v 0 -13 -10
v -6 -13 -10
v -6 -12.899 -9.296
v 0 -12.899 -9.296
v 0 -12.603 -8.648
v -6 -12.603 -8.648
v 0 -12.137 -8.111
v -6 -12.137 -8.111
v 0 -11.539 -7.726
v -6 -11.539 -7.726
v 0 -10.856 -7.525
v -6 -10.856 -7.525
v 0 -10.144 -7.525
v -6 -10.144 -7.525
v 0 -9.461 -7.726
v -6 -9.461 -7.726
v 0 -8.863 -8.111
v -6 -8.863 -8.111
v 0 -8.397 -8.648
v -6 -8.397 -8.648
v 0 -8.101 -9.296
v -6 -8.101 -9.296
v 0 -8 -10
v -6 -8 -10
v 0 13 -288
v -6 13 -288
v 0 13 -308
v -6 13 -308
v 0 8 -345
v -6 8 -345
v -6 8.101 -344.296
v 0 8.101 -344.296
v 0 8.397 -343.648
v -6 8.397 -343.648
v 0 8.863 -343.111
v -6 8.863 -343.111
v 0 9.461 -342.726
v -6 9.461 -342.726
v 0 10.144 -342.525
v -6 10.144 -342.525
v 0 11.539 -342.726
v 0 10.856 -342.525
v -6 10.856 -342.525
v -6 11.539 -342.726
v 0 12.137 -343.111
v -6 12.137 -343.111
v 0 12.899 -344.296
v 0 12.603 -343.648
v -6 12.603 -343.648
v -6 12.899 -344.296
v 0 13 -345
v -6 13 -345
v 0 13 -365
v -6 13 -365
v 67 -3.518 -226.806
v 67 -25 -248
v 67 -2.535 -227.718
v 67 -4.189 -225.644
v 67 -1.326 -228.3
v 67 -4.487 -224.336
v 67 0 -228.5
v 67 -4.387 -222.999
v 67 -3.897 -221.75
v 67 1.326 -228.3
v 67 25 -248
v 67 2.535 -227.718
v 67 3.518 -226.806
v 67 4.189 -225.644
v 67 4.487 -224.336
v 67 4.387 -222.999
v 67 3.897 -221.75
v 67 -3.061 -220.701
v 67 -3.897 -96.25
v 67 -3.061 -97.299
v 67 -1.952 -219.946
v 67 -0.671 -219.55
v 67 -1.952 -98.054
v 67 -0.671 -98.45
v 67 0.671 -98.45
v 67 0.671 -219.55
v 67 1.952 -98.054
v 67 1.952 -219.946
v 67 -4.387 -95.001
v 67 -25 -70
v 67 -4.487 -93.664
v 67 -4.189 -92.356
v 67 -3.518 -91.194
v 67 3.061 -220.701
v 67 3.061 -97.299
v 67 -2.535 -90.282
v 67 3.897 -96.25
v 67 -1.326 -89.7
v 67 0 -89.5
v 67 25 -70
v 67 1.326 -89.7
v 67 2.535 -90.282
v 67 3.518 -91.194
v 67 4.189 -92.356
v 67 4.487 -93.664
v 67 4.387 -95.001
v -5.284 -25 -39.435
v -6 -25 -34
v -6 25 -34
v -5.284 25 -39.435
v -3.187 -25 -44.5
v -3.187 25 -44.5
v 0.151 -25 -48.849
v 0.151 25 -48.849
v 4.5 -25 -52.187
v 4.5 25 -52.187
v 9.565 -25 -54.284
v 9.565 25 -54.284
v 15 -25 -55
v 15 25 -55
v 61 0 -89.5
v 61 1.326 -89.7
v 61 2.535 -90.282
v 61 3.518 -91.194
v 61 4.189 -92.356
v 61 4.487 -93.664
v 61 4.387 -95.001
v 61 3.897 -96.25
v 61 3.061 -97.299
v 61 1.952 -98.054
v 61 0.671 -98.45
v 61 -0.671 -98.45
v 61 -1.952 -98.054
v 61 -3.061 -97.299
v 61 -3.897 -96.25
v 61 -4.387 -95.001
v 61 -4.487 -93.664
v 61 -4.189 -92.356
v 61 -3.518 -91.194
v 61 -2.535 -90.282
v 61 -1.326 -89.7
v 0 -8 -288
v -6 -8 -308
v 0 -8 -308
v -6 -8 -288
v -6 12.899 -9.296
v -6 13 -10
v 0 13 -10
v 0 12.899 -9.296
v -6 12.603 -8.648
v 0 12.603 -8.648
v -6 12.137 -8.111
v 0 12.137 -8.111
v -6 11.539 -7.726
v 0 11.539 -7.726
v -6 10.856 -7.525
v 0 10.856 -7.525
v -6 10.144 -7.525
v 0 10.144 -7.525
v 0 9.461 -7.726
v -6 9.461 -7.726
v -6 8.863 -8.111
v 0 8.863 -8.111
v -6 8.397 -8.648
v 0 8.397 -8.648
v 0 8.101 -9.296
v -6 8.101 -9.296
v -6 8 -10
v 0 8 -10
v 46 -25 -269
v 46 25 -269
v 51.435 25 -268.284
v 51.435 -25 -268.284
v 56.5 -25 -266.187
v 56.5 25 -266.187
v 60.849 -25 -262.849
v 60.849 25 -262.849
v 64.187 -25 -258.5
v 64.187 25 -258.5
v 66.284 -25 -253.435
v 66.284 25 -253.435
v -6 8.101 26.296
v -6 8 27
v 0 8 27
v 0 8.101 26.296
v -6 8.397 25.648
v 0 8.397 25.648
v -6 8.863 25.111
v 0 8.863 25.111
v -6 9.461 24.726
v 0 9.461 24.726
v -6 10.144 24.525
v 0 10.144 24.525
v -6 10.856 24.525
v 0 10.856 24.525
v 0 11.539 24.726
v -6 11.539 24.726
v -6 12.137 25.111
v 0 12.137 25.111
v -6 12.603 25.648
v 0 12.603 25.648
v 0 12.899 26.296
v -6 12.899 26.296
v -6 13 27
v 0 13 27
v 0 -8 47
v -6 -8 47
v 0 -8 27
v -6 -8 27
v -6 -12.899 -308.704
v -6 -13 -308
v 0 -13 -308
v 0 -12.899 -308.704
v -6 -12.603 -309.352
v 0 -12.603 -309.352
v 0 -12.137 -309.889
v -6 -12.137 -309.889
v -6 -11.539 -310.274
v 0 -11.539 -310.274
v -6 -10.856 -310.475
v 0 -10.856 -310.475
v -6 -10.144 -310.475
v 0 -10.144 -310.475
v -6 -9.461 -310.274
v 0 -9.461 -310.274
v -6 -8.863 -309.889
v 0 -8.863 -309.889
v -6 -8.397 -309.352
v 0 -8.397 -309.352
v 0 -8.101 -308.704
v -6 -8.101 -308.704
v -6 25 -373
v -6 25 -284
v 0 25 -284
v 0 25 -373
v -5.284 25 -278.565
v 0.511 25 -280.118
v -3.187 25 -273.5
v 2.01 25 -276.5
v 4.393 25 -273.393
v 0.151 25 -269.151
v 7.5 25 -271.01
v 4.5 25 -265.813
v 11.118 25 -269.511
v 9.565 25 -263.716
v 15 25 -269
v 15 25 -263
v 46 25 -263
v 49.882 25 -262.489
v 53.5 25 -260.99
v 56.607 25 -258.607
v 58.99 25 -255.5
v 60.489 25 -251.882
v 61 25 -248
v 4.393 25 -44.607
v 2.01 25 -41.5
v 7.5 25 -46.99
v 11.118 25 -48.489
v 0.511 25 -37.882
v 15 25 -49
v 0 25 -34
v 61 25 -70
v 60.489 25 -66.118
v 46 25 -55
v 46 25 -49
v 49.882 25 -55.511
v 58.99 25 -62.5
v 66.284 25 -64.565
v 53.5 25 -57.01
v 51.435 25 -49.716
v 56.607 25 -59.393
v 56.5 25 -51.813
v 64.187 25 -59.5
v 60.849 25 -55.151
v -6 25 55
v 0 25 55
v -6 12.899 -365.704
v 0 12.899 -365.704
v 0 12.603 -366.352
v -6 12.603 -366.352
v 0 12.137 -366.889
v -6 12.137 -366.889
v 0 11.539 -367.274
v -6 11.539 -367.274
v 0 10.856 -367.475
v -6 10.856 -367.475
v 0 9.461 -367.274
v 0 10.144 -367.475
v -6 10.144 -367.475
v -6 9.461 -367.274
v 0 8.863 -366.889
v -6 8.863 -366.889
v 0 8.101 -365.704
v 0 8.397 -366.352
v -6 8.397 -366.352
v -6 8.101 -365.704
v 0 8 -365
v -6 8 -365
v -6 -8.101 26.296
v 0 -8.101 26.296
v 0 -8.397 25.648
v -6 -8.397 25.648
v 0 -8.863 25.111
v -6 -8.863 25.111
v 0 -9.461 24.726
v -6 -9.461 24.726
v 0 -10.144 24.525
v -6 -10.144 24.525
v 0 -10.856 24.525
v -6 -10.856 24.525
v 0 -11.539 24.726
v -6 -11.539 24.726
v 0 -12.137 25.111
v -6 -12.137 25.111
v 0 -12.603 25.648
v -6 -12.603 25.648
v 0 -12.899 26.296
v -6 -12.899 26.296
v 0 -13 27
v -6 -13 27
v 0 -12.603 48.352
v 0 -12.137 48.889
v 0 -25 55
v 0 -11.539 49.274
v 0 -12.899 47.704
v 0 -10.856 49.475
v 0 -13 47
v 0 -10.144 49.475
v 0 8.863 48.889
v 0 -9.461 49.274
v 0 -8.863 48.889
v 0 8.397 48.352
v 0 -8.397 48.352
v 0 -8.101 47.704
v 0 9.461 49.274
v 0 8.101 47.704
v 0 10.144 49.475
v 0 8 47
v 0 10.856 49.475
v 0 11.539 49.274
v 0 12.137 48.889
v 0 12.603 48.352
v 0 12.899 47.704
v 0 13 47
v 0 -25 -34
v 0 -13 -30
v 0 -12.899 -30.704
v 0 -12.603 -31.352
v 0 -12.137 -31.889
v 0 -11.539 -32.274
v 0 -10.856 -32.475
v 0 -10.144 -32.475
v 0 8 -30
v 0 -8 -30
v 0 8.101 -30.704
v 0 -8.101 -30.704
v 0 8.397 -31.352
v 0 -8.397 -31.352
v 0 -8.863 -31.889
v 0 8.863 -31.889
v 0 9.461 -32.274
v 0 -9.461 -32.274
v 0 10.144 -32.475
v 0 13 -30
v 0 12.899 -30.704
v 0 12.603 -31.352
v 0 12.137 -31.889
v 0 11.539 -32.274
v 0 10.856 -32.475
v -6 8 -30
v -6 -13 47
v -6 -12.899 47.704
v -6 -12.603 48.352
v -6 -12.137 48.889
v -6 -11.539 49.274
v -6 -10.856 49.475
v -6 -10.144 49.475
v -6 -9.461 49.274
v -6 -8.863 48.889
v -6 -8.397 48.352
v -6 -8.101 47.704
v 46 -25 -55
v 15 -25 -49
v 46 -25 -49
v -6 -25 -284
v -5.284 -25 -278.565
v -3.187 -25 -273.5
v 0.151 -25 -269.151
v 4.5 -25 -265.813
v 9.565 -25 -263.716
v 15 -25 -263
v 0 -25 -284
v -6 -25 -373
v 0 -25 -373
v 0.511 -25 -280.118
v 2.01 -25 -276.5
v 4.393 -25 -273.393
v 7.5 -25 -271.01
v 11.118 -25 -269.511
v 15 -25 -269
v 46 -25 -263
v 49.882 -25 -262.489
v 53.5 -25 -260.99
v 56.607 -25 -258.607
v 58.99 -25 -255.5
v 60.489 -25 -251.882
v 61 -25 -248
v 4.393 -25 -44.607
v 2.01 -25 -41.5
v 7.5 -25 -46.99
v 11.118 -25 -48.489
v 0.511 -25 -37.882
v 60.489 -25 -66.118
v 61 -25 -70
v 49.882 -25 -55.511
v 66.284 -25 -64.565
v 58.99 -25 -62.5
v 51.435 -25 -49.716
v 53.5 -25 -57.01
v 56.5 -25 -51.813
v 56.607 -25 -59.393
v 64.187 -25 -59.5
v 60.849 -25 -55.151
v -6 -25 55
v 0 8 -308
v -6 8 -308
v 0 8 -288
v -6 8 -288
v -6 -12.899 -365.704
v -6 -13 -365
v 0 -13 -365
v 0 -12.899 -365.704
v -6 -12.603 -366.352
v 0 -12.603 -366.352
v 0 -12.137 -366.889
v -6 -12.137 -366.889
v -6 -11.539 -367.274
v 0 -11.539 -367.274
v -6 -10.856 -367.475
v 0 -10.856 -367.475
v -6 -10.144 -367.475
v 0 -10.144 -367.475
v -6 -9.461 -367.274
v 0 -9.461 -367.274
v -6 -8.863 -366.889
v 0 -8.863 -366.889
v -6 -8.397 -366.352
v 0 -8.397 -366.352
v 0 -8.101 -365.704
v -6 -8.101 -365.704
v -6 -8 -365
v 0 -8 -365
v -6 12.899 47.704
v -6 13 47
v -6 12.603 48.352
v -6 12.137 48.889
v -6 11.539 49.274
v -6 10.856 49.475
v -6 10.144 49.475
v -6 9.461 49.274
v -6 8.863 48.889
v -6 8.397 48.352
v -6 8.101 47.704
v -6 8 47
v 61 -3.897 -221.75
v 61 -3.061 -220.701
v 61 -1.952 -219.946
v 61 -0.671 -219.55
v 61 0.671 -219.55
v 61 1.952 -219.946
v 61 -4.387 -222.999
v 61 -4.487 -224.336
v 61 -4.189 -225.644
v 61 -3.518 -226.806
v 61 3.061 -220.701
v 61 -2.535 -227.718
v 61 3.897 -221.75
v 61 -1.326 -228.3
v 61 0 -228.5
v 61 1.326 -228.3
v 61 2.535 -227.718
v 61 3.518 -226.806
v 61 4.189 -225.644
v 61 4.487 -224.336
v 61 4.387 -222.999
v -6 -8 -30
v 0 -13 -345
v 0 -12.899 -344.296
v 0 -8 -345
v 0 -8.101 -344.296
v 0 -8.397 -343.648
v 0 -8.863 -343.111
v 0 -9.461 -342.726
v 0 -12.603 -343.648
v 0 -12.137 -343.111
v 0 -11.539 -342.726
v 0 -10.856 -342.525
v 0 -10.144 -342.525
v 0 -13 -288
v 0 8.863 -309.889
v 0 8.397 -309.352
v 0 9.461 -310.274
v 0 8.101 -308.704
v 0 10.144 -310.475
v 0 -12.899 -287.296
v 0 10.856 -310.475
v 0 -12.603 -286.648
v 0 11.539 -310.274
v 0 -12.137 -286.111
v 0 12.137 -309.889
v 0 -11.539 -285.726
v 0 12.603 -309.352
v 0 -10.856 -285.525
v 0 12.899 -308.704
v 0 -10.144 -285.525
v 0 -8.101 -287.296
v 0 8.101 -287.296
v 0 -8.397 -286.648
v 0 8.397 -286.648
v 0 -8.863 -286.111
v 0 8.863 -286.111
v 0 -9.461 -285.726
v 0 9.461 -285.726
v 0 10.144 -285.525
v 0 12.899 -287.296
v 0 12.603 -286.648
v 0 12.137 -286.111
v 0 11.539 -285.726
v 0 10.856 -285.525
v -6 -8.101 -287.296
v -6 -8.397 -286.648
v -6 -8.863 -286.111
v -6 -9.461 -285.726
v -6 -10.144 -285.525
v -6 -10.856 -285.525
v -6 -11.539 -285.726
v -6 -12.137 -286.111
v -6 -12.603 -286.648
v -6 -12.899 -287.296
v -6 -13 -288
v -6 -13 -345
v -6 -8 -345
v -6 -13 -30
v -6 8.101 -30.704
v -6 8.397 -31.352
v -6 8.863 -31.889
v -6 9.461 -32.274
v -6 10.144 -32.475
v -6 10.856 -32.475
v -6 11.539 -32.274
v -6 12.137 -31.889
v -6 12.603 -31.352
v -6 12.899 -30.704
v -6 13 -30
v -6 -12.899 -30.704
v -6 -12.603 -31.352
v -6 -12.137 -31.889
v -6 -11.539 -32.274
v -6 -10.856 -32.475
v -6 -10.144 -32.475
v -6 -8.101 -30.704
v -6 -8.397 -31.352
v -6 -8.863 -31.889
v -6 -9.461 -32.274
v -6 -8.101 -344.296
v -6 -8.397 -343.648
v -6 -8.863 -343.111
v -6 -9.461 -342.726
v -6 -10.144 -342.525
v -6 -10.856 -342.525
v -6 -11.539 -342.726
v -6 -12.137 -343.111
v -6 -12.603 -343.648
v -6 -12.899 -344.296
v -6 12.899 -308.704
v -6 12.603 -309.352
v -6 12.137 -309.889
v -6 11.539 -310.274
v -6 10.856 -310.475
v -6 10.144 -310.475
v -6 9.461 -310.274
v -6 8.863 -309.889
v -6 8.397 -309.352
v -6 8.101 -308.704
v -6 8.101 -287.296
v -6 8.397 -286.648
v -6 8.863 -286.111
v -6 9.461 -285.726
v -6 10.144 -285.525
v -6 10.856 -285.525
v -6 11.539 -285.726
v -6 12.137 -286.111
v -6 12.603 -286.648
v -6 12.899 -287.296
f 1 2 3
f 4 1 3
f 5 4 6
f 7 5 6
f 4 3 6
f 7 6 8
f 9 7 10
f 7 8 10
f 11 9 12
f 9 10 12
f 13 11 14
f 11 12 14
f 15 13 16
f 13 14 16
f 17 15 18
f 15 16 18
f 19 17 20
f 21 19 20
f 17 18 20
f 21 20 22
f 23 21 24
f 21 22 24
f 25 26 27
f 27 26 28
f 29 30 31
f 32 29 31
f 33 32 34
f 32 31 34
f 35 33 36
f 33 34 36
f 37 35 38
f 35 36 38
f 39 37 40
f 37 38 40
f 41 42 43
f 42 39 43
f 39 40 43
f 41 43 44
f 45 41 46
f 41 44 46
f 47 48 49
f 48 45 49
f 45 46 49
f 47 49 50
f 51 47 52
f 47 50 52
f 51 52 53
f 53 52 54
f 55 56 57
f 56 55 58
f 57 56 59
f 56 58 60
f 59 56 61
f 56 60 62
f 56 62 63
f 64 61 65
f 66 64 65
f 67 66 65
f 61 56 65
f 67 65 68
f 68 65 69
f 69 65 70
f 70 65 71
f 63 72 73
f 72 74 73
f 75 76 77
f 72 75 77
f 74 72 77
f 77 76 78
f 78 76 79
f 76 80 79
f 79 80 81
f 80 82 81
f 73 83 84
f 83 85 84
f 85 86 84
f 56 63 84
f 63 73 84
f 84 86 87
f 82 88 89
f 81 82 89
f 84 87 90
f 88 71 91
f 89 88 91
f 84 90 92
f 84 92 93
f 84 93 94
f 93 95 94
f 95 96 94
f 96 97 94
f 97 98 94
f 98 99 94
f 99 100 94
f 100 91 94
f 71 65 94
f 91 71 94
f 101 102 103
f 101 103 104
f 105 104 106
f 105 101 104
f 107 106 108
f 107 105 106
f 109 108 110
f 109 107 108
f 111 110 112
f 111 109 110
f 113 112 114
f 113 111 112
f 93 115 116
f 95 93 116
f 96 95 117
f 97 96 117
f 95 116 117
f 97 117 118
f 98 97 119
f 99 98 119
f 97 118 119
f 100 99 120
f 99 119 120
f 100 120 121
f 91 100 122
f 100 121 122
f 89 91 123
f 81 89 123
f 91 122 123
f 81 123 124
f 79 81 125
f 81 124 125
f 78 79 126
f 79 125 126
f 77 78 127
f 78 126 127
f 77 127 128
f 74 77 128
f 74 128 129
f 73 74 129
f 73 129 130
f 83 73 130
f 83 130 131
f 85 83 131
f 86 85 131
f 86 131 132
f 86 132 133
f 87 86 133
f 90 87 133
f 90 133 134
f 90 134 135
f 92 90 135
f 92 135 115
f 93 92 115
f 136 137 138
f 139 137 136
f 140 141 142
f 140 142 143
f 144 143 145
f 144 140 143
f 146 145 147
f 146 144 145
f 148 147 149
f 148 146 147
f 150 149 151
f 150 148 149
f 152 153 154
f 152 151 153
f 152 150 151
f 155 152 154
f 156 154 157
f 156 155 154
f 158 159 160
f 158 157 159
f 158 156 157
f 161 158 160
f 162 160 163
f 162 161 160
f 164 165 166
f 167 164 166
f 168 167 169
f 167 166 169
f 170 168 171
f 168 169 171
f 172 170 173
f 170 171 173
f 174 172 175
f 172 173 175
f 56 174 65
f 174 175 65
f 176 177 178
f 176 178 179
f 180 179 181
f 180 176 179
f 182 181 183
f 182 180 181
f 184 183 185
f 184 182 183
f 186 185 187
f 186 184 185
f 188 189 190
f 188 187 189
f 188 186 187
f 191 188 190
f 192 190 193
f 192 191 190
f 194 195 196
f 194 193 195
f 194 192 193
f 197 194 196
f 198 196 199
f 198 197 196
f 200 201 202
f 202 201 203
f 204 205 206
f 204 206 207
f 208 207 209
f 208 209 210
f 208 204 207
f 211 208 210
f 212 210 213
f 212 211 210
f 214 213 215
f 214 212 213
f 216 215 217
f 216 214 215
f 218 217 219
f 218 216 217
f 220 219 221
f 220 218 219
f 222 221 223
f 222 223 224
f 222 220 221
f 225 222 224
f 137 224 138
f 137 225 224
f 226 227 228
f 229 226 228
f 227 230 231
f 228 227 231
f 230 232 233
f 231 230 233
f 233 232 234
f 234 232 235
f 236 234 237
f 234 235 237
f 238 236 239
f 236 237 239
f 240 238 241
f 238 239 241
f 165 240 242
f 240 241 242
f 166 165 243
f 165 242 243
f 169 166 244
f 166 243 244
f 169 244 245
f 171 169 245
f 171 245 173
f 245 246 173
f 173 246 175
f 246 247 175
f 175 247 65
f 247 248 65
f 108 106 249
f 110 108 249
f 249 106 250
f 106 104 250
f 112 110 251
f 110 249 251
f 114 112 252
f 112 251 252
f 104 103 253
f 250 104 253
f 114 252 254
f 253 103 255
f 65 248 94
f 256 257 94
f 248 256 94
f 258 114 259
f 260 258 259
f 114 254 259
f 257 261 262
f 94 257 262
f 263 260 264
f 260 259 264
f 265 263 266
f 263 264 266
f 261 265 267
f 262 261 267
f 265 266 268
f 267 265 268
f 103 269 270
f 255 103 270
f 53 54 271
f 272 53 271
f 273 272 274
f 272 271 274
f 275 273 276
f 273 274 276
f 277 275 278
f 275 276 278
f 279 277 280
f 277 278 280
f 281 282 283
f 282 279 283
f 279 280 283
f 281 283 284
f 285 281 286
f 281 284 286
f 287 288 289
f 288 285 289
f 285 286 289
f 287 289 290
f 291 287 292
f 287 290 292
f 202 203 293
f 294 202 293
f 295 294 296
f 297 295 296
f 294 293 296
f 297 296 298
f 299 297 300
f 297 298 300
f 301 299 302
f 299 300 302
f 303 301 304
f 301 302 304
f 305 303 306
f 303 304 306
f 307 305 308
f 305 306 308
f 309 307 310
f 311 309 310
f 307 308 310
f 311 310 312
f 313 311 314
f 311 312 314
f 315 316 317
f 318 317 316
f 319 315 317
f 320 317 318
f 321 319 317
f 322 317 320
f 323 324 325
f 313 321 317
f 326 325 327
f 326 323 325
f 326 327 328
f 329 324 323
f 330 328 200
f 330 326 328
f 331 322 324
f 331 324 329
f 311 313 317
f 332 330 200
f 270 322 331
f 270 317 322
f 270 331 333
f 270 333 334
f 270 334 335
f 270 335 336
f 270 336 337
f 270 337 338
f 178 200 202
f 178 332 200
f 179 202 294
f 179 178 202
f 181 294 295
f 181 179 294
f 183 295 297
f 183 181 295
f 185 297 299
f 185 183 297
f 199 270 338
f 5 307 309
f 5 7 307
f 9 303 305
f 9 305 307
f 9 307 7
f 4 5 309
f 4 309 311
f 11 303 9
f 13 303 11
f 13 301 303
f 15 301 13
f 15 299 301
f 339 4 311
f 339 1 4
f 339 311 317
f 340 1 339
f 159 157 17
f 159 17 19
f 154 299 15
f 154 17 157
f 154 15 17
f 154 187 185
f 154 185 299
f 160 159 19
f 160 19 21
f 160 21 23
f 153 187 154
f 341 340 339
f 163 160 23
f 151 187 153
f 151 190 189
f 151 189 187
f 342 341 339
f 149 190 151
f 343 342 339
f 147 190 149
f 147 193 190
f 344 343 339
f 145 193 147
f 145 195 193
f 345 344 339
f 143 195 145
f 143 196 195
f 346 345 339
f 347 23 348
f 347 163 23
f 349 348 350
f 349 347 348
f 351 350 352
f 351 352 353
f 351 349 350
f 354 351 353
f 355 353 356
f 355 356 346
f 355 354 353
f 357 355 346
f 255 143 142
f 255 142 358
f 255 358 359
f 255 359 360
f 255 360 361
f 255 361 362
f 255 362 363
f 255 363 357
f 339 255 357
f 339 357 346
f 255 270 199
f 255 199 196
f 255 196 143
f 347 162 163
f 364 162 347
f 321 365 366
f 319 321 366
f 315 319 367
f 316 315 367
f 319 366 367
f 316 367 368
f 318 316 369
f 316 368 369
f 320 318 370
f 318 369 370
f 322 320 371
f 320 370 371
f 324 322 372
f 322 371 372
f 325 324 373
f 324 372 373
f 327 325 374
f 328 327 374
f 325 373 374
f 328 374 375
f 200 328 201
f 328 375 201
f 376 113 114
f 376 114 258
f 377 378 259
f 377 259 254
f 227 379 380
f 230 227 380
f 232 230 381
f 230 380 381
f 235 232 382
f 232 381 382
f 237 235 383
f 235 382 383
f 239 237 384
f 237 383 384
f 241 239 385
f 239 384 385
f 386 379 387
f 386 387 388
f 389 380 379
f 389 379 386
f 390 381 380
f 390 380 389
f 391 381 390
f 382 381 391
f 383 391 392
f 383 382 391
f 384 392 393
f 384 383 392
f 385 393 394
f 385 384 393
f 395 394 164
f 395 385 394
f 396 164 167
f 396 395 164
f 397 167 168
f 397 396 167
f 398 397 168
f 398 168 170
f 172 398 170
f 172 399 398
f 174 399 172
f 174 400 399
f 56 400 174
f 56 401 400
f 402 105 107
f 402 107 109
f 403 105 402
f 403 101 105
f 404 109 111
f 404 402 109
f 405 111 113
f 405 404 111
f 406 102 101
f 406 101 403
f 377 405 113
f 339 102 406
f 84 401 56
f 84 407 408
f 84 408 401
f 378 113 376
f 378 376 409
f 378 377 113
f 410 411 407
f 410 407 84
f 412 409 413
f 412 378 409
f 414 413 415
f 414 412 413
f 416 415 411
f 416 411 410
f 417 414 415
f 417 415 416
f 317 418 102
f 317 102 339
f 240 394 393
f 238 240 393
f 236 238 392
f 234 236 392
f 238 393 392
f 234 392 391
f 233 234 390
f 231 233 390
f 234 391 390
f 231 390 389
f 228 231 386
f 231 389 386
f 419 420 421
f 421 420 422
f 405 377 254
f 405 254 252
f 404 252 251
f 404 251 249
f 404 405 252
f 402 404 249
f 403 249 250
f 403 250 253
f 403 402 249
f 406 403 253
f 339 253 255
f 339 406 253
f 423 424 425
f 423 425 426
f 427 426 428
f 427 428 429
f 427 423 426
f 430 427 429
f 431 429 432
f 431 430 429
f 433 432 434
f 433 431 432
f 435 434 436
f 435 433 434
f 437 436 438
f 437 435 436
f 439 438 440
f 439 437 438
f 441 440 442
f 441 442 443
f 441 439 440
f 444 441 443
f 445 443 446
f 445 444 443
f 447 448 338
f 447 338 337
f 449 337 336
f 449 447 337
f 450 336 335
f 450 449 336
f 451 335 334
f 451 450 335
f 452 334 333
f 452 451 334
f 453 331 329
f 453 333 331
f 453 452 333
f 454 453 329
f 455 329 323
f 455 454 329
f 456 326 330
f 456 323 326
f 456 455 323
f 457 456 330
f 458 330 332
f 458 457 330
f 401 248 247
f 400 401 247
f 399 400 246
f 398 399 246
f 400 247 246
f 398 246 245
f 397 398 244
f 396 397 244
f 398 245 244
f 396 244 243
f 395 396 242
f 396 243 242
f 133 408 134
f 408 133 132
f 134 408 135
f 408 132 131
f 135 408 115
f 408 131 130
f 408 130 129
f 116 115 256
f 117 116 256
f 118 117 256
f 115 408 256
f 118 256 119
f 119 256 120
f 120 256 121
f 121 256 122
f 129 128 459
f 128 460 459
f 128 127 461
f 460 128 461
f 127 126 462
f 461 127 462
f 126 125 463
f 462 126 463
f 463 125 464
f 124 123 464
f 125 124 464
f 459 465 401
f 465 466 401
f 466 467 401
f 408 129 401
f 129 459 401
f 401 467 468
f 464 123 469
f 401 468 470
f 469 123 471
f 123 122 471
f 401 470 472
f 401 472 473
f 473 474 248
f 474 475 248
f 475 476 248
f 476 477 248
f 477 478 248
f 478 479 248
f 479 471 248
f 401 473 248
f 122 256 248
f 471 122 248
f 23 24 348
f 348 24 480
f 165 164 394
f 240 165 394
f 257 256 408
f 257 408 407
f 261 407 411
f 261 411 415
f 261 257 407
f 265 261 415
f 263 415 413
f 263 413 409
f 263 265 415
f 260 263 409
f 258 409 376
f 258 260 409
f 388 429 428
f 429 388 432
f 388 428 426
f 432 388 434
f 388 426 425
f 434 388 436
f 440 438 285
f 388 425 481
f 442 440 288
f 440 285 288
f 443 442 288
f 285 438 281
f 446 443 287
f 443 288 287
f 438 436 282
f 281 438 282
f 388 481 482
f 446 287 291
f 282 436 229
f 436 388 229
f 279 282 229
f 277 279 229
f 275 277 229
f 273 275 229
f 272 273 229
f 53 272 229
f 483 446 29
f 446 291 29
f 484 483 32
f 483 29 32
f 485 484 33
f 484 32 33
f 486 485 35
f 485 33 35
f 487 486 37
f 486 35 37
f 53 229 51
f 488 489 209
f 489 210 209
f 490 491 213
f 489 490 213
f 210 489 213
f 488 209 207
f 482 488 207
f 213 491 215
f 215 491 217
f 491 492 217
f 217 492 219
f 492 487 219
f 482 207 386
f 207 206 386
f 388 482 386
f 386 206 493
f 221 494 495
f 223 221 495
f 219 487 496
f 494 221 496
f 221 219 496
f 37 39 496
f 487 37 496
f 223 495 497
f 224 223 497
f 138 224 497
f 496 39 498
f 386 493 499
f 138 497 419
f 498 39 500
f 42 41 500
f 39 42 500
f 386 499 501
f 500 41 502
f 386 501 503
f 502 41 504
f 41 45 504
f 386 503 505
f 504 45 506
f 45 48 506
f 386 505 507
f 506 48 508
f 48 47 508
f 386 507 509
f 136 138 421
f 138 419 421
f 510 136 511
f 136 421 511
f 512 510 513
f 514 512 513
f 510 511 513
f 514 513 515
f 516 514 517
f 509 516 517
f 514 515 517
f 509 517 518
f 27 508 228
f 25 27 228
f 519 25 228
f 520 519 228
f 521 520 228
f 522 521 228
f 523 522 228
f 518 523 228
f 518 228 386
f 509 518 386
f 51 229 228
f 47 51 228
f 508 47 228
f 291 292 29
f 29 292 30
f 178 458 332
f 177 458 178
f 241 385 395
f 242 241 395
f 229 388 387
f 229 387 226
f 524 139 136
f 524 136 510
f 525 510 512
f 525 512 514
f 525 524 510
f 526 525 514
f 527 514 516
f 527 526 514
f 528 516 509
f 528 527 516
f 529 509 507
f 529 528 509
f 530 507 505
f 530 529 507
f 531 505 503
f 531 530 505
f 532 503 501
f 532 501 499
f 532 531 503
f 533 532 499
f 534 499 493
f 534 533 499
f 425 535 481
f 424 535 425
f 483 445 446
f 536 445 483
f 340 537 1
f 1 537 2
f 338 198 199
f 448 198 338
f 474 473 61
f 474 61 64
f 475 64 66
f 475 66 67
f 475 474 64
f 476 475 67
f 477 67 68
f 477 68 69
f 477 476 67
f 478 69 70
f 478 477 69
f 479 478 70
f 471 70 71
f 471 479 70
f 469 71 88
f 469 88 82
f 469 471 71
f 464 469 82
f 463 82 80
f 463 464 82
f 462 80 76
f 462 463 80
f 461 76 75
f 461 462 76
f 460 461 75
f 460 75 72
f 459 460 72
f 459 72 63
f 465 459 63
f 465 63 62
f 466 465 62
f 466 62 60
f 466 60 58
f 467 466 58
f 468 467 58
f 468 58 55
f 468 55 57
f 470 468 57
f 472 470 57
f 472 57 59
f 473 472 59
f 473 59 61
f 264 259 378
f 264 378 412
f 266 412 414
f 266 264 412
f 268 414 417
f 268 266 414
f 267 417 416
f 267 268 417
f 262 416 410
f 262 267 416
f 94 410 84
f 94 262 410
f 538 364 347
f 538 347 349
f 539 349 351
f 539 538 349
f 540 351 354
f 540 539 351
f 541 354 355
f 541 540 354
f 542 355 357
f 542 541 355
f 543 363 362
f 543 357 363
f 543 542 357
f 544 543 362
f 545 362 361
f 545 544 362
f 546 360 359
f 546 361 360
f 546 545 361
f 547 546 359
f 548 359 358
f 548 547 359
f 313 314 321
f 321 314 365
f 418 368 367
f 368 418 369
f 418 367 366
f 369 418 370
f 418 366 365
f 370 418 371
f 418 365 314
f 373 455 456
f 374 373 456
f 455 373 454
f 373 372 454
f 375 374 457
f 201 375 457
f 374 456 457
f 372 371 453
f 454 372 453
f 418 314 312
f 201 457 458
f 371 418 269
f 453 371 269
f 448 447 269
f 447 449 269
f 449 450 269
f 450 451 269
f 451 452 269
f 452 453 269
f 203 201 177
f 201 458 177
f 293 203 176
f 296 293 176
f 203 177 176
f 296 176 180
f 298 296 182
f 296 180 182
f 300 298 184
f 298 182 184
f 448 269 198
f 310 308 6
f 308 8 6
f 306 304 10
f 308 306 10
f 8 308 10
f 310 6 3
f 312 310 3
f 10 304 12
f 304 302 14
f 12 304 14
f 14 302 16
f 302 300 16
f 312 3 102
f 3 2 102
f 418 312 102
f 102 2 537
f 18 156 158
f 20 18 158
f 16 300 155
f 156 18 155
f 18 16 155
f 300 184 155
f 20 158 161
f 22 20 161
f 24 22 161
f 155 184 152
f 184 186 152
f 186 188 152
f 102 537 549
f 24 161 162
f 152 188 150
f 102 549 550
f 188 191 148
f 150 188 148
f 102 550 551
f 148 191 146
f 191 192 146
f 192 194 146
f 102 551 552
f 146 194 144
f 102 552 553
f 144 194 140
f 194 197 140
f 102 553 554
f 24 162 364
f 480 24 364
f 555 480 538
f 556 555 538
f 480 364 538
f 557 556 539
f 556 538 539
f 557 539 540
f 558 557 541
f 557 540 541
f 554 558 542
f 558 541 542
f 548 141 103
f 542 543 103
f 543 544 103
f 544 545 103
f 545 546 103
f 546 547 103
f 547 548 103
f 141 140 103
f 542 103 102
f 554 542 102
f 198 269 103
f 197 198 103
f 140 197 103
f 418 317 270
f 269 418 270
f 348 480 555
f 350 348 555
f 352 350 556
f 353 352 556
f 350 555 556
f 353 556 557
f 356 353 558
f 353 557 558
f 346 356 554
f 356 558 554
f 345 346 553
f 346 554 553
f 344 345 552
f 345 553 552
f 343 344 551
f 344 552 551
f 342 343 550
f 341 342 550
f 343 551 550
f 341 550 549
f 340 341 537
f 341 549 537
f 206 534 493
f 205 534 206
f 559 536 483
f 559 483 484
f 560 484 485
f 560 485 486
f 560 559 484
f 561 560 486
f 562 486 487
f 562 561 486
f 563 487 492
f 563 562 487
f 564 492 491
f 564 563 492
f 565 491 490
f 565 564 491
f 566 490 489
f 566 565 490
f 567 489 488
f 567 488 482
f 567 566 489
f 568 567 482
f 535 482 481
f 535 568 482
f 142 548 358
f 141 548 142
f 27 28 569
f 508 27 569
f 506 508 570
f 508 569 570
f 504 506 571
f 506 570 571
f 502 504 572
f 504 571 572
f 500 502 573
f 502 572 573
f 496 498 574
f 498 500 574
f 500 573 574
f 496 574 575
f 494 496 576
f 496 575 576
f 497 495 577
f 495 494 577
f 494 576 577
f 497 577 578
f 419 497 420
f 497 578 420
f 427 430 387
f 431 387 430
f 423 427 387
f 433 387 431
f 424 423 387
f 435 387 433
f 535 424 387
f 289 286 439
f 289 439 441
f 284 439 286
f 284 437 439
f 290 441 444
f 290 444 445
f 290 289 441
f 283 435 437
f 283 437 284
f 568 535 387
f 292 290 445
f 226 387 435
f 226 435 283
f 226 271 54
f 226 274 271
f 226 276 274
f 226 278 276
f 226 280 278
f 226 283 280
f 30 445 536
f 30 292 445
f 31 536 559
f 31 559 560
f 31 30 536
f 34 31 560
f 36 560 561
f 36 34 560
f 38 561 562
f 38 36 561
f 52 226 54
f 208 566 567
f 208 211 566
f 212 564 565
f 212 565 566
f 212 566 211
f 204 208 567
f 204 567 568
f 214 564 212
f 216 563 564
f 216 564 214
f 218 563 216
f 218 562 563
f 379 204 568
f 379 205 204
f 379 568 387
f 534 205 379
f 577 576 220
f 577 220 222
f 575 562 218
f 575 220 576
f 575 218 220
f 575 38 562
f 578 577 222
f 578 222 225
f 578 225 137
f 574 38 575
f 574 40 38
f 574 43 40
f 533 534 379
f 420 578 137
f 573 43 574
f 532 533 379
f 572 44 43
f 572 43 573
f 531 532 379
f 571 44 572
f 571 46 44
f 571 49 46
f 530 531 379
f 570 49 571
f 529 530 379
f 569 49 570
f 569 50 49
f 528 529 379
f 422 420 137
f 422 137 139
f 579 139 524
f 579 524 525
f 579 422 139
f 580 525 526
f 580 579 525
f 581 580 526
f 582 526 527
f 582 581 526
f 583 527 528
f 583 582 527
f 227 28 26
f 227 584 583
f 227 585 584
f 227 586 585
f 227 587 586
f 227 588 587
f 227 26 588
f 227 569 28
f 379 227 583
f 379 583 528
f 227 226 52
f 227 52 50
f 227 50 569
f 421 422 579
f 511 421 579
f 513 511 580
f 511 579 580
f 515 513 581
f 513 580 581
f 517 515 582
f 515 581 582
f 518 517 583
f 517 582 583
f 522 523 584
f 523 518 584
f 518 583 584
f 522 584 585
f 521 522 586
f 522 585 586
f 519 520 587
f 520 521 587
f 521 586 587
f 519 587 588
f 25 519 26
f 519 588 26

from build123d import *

# Parameters (mm, degrees)
SKETCH1_W                    = 110
SKETCH1_H                    = 50
BASE_FLANGE1_DEPTH           = 6
CUT_EXTRUDE1_DEPTH           = 10
LPATTERN1_COUNT              = 2
LPATTERN1_PITCH              = 57
MIRROR1_COPY_1_DEPTH         = 10
EDGE_FLANGE1_STRIP_W         = 54
EDGE_FLANGE1_STRIP_H         = 6
EDGE_FLANGE1_STRIP_CUT_DEPTH = 50
EDGE_FLANGE1_DEPTH           = 50
EDGE_FLANGE2_STRIP_W         = 54
EDGE_FLANGE2_STRIP_H         = 6
EDGE_FLANGE2_STRIP_CUT_DEPTH = 50
EDGE_FLANGE2_DEPTH           = 50
SKETCH9_R                    = 4.5
CUT_EXTRUDE2_DEPTH           = 10


# Sheet-metal steps are written as plain solids
with BuildPart() as part:
    # Sketch1 → Base-Flange1 (new body)
    with BuildSketch(Plane(origin=(0, 0, 0), x_dir=(0, 0, -1), z_dir=(1, 0, 0))):
        Rectangle(SKETCH1_W, SKETCH1_H)
    extrude(amount=-BASE_FLANGE1_DEPTH)

    # Sketch5 → Cut-Extrude1 (cut)
    with BuildSketch(Plane.ZY.offset(6)):
        with BuildLine():
            Line((-30, 13), (-10, 13))
            ThreePointArc((-10, 13), (-7.5, 10.5), (-10, 8))
            Line((-10, 8), (-30, 8))
            ThreePointArc((-30, 8), (-32.5, 10.5), (-30, 13))
        make_face()
    cut_extrude1 = extrude(amount=-CUT_EXTRUDE1_DEPTH, mode=Mode.SUBTRACT)

    # LPattern1: Cut-Extrude1 ×2
    with Locations(*[(0, 0, i * LPATTERN1_PITCH) for i in range(1, LPATTERN1_COUNT)]):
        add(cut_extrude1, mode=Mode.SUBTRACT)

    # Mirror1: Cut-Extrude1 across plane
    add(cut_extrude1.mirror(Plane.ZX), mode=Mode.SUBTRACT)

    # Mirror1 copy 1 sketch → Mirror1 copy 1 (cut)
    with BuildSketch(Plane(origin=(-6, 0, 57), x_dir=(0, 0, 1), z_dir=(-1, 0, 0))):
        with BuildLine():
            Line((-30, -13), (-10, -13))
            ThreePointArc((-10, -13), (-7.5, -10.5), (-10, -8))
            Line((-10, -8), (-30, -8))
            ThreePointArc((-30, -8), (-32.5, -10.5), (-30, -13))
        make_face()
    extrude(amount=-MIRROR1_COPY_1_DEPTH, mode=Mode.SUBTRACT)

    # Edge-Flange1 strip (across the edge) → Edge-Flange1 strip cut (cut)
    with BuildSketch(Plane(origin=(0, -25, -55), x_dir=(0, 0, 1), z_dir=(0, 1, 0))):
        with Locations((-6, -3)):
            Rectangle(EDGE_FLANGE1_STRIP_W, EDGE_FLANGE1_STRIP_H)
    extrude(amount=EDGE_FLANGE1_STRIP_CUT_DEPTH, mode=Mode.SUBTRACT)

    # Edge-Flange1 section (across the edge) → Edge-Flange1 (add)
    with BuildSketch(Plane(origin=(0, -25, -55), x_dir=(0, 0, 1), z_dir=(0, 1, 0))):
        with BuildLine():
            Line((0, 15), (0, 67))
            Line((0, 67), (6, 67))
            Line((6, 67), (6, 15))
            ThreePointArc((6, 15), (10.393398282, 4.393398282), (21, 0))
            Line((21, 0), (21, -6))
            ThreePointArc((21, -6), (6.150757595, 0.150757595), (0, 15))
        make_face()
    extrude(amount=EDGE_FLANGE1_DEPTH)

    # Edge-Flange2 strip (across the edge) → Edge-Flange2 strip cut (cut)
    with BuildSketch(Plane(origin=(67, 25, -55), x_dir=(-1, 0, 0), z_dir=(0, -1, 0))):
        with Locations((-6, -3)):
            Rectangle(EDGE_FLANGE2_STRIP_W, EDGE_FLANGE2_STRIP_H)
    extrude(amount=EDGE_FLANGE2_STRIP_CUT_DEPTH, mode=Mode.SUBTRACT)

    # Edge-Flange2 section (across the edge) → Edge-Flange2 (add)
    with BuildSketch(Plane(origin=(67, 25, -55), x_dir=(-1, 0, 0), z_dir=(0, -1, 0))):
        with BuildLine():
            Line((0, 15), (0, 104))
            Line((0, 104), (6, 104))
            Line((6, 104), (6, 15))
            ThreePointArc((6, 15), (10.393398282, 4.393398282), (21, 0))
            Line((21, 0), (21, -6))
            ThreePointArc((21, -6), (6.150757595, 0.150757595), (0, 15))
        make_face()
    extrude(amount=EDGE_FLANGE2_DEPTH)

    # Sketch9 → Cut-Extrude2 (cut)
    with BuildSketch(Plane.ZY.offset(-61)):
        with Locations((-94, 0)):
            Circle(SKETCH9_R)
    extrude(amount=-CUT_EXTRUDE2_DEPTH, mode=Mode.SUBTRACT)

    # Mirror2: part across plane


with BuildPart() as part_1:
    add(part.part)
    add(part.part.mirror(Plane(origin=(67, 25, -159), x_dir=(1, 0, 0), z_dir=(0, 0, 1))))


solid = part_1.part
